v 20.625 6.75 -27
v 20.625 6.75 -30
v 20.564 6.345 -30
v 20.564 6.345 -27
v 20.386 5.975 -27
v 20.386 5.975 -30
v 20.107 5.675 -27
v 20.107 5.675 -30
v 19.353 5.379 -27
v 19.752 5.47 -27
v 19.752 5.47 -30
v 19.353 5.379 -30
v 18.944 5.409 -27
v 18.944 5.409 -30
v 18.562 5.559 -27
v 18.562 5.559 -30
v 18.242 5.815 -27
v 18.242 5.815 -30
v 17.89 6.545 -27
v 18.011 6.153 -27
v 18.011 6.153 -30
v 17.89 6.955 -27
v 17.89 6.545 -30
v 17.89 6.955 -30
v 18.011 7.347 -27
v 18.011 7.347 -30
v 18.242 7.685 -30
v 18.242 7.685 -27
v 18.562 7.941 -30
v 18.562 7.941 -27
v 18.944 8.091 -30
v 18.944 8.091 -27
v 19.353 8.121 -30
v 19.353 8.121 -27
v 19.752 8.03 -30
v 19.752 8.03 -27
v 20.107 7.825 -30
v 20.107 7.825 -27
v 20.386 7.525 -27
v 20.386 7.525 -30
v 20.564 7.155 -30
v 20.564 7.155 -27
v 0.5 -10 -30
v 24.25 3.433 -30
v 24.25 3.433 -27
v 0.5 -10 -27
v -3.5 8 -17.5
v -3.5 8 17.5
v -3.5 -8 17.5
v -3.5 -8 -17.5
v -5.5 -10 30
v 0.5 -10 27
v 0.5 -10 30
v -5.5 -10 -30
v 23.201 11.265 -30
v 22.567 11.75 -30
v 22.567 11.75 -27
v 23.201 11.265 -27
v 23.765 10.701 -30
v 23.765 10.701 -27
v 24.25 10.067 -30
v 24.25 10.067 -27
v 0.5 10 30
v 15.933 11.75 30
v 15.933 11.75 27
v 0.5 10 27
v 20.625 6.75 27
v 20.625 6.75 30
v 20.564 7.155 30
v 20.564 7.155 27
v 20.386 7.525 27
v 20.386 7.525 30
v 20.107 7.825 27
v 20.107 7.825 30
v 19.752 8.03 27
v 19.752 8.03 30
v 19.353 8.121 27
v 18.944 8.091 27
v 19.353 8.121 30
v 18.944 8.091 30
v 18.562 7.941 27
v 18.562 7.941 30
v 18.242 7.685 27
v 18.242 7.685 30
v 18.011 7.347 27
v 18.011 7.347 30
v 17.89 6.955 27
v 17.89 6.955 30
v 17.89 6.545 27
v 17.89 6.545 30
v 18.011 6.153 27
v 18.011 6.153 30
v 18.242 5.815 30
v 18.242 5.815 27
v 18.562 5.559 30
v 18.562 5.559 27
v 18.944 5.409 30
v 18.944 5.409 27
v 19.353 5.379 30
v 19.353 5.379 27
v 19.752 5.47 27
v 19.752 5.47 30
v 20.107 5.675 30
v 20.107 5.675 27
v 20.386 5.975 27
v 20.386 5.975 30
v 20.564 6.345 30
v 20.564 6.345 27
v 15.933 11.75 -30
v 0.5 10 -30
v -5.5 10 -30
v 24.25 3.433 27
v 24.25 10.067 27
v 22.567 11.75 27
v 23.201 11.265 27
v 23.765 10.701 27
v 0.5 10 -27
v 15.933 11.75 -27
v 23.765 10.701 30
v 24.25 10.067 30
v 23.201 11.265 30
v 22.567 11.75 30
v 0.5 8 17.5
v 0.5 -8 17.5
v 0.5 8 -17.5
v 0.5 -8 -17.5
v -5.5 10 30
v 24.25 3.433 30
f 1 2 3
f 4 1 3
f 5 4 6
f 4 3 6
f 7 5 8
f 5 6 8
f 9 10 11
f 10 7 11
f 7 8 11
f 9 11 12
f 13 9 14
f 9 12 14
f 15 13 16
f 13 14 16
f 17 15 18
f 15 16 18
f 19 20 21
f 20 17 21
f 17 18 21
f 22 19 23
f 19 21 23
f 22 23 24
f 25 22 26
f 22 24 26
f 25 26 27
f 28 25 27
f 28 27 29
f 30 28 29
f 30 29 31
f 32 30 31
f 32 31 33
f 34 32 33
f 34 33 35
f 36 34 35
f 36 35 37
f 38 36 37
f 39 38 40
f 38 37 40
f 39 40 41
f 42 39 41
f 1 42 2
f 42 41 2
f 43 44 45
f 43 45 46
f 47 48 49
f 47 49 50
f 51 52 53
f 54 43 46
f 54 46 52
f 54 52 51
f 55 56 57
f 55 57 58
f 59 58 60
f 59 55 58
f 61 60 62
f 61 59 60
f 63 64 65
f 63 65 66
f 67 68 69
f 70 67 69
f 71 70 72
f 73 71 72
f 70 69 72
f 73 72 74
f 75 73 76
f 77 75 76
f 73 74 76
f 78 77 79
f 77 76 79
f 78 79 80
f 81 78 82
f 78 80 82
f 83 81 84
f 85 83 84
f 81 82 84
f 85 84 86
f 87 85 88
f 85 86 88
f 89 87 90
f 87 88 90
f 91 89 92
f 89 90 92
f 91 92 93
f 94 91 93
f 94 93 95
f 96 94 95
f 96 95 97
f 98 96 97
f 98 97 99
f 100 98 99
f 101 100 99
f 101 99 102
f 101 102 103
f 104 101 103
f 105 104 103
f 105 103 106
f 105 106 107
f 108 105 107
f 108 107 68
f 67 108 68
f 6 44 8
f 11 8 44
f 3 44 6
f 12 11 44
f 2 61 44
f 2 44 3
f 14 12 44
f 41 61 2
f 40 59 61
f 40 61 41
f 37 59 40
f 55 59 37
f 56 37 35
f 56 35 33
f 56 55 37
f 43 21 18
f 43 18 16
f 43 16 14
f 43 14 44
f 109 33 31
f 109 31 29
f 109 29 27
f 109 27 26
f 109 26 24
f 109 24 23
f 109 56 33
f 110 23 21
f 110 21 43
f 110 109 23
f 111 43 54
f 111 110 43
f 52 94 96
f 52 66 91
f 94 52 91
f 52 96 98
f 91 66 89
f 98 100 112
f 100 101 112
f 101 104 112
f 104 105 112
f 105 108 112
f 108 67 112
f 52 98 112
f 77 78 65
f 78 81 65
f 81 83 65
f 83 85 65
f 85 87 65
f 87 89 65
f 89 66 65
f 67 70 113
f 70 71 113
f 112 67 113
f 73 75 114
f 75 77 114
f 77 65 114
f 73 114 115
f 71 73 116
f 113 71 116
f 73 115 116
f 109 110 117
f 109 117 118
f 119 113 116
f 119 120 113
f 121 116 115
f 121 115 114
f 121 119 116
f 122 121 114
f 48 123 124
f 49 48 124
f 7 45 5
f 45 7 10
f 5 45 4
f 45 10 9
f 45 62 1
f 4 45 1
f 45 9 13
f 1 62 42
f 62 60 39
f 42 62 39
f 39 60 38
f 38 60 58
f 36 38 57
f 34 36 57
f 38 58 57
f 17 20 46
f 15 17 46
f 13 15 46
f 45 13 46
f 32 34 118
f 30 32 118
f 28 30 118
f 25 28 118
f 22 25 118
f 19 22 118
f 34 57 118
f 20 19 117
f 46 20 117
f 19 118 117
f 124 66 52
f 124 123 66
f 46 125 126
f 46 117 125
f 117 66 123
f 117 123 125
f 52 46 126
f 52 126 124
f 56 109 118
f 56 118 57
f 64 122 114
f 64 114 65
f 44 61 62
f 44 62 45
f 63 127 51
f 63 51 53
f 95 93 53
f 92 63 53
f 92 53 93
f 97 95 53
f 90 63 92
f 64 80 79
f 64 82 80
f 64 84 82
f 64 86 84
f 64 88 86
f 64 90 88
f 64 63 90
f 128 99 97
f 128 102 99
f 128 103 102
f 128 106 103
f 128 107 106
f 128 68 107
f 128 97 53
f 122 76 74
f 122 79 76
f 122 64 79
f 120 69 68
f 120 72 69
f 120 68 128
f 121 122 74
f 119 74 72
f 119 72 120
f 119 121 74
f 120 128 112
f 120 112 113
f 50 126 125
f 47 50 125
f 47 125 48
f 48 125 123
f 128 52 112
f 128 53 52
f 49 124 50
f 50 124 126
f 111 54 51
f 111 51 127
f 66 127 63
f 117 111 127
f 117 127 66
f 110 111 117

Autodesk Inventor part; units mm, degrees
ref_plane "YZ Plane" through (0, 0, 0) normal (1, 0, 0) x (0, 1, 0)
ref_plane "XZ Plane" through (0, 0, 0) normal (0, 1, 0) x (-1, 0, 0)
ref_plane "Work Plane1" through (4.77, 2.8444, 22.011) normal (0, 0, 1) x (1, 0, 0)
sketch "Sketch1" plane through (0, 0, 0) normal (0, 0, 1) x (1, 0, 0)
  line L0 (0.5, -10) -> (-5.5, -10)
  line L1 (-5.5, -10) -> (-5.5, 10)
  line L2 (-5.5, 10) -> (0.5, 10)
  line L3 (0.5, 10) -> (0.5, -10)
  line L4 (-4, 8) -> (-4, -8) construction
  line L5 (0, 8) -> (-4, 8) construction
  line L6 (0, -8) -> (-4, -8) construction
  line L7 (0.5, -14.6916) -> (0.5, 15.0789) construction
  point P0 (0, 0)
  dimension "d0" = 2
  dimension "d1" = 2
  dimension "d3" = 6
  dimension "d4" = 0
extrude "Extrusion1" add sketch "Sketch1" along normal mid plane 60
sketch "Sketch2" plane through (0.5, -10, 30) normal (1, 0, 0) x (0, 0, -1)
  line L0 (47.5, 18) -> (12.5, 18) projected
  line L1 (12.5, 18) -> (12.5, 2) projected
  line L2 (12.5, 2) -> (47.5, 2) projected
  line L3 (47.5, 2) -> (47.5, 18) projected
  line L4 (41.725, 8.15) -> (18.275, 8.15) projected
  arc A0 (17.675, 8.75) -> (18.275, 8.15) centre (18.275, 8.75) ccw projected
  line L5 (17.675, 8.75) -> (17.675, 11.25) projected
  arc A1 (18.275, 11.85) -> (17.675, 11.25) centre (18.275, 11.25) ccw projected
  line L6 (18.275, 11.85) -> (41.725, 11.85) projected
  arc A2 (42.325, 11.25) -> (41.725, 11.85) centre (41.725, 11.25) ccw projected
  line L7 (42.325, 11.25) -> (42.325, 8.75) projected
  arc A3 (41.725, 8.15) -> (42.325, 8.75) centre (41.725, 8.75) ccw projected
  point P0 (30, 10)
extrude "Extrusion2" cut sketch "Sketch2" against normal blind 4 contours L3 L2 L1 L0 | L4 A0 L5 A1 L6 A2 L7 A3
sketch "Sketch3" plane through (0, 0, 30) normal (0, 0, 1) x (1, 0, 0)
  arc A0 (13.2615, 6.3791) -> (13.2616, 6.3779) centre (19.25, 6.75) ccw construction
  line L0 (-5.5, -10) -> (0.5, -10) projected
  line L1 (0.5, 10) -> (-5.5, 10) projected
  line L2 (0.5, 10) -> (0.5, -10)
  circle A1 centre (19.25, 6.75) radius 1.375
  line L3 (4.77, 6.75) -> (24.4771, 6.75) construction
  line L4 (24.25, 3.4334) -> (24.25, 10.0666)
  line L5 (22.5666, 11.75) -> (15.9334, 11.75)
  line L6 (24.25, 6.75) -> (19.25, 6.75) construction
  line L7 (19.25, 11.75) -> (19.25, 6.75) construction
  arc A2 (18.6093, 0.7843) -> (22.5666, 11.75) centre (19.25, 6.75) ccw
  line L8 (15.9334, 11.75) -> (0.5, 10)
  line L9 (0.5, -10) -> (24.25, 3.4334)
  arc A3 (2.5, 31.5) -> (-5.5, -10) centre (19.25, 6.75) ccw construction
  line L10 (0.5, -10) -> (0.5, 10) construction
  arc A4 (2.5, 25.5) -> (0.5, -10) centre (19.25, 6.75) ccw construction
  line L11 (2.5, 31.5) -> (2.5, 25.5) construction
  line L12 (2.77, 3.75) -> (0.5, 3.75) construction
  point P0 (0, 0)
  point P1 (19.25, 12.75)
  dimension "d12" = 2.75
  dimension "d13" = 6
  dimension "d18" = 1
  dimension "d19" = 2
  dimension "d20" = 3
extrude "Extrusion3" add sketch "Sketch3" against normal blind 3 contours L8 L5 A2 L4 L9 L2
mirror "Mirror1" about plane through (0, 0, 0) normal (0, 0, 1) of "Extrusion3"
